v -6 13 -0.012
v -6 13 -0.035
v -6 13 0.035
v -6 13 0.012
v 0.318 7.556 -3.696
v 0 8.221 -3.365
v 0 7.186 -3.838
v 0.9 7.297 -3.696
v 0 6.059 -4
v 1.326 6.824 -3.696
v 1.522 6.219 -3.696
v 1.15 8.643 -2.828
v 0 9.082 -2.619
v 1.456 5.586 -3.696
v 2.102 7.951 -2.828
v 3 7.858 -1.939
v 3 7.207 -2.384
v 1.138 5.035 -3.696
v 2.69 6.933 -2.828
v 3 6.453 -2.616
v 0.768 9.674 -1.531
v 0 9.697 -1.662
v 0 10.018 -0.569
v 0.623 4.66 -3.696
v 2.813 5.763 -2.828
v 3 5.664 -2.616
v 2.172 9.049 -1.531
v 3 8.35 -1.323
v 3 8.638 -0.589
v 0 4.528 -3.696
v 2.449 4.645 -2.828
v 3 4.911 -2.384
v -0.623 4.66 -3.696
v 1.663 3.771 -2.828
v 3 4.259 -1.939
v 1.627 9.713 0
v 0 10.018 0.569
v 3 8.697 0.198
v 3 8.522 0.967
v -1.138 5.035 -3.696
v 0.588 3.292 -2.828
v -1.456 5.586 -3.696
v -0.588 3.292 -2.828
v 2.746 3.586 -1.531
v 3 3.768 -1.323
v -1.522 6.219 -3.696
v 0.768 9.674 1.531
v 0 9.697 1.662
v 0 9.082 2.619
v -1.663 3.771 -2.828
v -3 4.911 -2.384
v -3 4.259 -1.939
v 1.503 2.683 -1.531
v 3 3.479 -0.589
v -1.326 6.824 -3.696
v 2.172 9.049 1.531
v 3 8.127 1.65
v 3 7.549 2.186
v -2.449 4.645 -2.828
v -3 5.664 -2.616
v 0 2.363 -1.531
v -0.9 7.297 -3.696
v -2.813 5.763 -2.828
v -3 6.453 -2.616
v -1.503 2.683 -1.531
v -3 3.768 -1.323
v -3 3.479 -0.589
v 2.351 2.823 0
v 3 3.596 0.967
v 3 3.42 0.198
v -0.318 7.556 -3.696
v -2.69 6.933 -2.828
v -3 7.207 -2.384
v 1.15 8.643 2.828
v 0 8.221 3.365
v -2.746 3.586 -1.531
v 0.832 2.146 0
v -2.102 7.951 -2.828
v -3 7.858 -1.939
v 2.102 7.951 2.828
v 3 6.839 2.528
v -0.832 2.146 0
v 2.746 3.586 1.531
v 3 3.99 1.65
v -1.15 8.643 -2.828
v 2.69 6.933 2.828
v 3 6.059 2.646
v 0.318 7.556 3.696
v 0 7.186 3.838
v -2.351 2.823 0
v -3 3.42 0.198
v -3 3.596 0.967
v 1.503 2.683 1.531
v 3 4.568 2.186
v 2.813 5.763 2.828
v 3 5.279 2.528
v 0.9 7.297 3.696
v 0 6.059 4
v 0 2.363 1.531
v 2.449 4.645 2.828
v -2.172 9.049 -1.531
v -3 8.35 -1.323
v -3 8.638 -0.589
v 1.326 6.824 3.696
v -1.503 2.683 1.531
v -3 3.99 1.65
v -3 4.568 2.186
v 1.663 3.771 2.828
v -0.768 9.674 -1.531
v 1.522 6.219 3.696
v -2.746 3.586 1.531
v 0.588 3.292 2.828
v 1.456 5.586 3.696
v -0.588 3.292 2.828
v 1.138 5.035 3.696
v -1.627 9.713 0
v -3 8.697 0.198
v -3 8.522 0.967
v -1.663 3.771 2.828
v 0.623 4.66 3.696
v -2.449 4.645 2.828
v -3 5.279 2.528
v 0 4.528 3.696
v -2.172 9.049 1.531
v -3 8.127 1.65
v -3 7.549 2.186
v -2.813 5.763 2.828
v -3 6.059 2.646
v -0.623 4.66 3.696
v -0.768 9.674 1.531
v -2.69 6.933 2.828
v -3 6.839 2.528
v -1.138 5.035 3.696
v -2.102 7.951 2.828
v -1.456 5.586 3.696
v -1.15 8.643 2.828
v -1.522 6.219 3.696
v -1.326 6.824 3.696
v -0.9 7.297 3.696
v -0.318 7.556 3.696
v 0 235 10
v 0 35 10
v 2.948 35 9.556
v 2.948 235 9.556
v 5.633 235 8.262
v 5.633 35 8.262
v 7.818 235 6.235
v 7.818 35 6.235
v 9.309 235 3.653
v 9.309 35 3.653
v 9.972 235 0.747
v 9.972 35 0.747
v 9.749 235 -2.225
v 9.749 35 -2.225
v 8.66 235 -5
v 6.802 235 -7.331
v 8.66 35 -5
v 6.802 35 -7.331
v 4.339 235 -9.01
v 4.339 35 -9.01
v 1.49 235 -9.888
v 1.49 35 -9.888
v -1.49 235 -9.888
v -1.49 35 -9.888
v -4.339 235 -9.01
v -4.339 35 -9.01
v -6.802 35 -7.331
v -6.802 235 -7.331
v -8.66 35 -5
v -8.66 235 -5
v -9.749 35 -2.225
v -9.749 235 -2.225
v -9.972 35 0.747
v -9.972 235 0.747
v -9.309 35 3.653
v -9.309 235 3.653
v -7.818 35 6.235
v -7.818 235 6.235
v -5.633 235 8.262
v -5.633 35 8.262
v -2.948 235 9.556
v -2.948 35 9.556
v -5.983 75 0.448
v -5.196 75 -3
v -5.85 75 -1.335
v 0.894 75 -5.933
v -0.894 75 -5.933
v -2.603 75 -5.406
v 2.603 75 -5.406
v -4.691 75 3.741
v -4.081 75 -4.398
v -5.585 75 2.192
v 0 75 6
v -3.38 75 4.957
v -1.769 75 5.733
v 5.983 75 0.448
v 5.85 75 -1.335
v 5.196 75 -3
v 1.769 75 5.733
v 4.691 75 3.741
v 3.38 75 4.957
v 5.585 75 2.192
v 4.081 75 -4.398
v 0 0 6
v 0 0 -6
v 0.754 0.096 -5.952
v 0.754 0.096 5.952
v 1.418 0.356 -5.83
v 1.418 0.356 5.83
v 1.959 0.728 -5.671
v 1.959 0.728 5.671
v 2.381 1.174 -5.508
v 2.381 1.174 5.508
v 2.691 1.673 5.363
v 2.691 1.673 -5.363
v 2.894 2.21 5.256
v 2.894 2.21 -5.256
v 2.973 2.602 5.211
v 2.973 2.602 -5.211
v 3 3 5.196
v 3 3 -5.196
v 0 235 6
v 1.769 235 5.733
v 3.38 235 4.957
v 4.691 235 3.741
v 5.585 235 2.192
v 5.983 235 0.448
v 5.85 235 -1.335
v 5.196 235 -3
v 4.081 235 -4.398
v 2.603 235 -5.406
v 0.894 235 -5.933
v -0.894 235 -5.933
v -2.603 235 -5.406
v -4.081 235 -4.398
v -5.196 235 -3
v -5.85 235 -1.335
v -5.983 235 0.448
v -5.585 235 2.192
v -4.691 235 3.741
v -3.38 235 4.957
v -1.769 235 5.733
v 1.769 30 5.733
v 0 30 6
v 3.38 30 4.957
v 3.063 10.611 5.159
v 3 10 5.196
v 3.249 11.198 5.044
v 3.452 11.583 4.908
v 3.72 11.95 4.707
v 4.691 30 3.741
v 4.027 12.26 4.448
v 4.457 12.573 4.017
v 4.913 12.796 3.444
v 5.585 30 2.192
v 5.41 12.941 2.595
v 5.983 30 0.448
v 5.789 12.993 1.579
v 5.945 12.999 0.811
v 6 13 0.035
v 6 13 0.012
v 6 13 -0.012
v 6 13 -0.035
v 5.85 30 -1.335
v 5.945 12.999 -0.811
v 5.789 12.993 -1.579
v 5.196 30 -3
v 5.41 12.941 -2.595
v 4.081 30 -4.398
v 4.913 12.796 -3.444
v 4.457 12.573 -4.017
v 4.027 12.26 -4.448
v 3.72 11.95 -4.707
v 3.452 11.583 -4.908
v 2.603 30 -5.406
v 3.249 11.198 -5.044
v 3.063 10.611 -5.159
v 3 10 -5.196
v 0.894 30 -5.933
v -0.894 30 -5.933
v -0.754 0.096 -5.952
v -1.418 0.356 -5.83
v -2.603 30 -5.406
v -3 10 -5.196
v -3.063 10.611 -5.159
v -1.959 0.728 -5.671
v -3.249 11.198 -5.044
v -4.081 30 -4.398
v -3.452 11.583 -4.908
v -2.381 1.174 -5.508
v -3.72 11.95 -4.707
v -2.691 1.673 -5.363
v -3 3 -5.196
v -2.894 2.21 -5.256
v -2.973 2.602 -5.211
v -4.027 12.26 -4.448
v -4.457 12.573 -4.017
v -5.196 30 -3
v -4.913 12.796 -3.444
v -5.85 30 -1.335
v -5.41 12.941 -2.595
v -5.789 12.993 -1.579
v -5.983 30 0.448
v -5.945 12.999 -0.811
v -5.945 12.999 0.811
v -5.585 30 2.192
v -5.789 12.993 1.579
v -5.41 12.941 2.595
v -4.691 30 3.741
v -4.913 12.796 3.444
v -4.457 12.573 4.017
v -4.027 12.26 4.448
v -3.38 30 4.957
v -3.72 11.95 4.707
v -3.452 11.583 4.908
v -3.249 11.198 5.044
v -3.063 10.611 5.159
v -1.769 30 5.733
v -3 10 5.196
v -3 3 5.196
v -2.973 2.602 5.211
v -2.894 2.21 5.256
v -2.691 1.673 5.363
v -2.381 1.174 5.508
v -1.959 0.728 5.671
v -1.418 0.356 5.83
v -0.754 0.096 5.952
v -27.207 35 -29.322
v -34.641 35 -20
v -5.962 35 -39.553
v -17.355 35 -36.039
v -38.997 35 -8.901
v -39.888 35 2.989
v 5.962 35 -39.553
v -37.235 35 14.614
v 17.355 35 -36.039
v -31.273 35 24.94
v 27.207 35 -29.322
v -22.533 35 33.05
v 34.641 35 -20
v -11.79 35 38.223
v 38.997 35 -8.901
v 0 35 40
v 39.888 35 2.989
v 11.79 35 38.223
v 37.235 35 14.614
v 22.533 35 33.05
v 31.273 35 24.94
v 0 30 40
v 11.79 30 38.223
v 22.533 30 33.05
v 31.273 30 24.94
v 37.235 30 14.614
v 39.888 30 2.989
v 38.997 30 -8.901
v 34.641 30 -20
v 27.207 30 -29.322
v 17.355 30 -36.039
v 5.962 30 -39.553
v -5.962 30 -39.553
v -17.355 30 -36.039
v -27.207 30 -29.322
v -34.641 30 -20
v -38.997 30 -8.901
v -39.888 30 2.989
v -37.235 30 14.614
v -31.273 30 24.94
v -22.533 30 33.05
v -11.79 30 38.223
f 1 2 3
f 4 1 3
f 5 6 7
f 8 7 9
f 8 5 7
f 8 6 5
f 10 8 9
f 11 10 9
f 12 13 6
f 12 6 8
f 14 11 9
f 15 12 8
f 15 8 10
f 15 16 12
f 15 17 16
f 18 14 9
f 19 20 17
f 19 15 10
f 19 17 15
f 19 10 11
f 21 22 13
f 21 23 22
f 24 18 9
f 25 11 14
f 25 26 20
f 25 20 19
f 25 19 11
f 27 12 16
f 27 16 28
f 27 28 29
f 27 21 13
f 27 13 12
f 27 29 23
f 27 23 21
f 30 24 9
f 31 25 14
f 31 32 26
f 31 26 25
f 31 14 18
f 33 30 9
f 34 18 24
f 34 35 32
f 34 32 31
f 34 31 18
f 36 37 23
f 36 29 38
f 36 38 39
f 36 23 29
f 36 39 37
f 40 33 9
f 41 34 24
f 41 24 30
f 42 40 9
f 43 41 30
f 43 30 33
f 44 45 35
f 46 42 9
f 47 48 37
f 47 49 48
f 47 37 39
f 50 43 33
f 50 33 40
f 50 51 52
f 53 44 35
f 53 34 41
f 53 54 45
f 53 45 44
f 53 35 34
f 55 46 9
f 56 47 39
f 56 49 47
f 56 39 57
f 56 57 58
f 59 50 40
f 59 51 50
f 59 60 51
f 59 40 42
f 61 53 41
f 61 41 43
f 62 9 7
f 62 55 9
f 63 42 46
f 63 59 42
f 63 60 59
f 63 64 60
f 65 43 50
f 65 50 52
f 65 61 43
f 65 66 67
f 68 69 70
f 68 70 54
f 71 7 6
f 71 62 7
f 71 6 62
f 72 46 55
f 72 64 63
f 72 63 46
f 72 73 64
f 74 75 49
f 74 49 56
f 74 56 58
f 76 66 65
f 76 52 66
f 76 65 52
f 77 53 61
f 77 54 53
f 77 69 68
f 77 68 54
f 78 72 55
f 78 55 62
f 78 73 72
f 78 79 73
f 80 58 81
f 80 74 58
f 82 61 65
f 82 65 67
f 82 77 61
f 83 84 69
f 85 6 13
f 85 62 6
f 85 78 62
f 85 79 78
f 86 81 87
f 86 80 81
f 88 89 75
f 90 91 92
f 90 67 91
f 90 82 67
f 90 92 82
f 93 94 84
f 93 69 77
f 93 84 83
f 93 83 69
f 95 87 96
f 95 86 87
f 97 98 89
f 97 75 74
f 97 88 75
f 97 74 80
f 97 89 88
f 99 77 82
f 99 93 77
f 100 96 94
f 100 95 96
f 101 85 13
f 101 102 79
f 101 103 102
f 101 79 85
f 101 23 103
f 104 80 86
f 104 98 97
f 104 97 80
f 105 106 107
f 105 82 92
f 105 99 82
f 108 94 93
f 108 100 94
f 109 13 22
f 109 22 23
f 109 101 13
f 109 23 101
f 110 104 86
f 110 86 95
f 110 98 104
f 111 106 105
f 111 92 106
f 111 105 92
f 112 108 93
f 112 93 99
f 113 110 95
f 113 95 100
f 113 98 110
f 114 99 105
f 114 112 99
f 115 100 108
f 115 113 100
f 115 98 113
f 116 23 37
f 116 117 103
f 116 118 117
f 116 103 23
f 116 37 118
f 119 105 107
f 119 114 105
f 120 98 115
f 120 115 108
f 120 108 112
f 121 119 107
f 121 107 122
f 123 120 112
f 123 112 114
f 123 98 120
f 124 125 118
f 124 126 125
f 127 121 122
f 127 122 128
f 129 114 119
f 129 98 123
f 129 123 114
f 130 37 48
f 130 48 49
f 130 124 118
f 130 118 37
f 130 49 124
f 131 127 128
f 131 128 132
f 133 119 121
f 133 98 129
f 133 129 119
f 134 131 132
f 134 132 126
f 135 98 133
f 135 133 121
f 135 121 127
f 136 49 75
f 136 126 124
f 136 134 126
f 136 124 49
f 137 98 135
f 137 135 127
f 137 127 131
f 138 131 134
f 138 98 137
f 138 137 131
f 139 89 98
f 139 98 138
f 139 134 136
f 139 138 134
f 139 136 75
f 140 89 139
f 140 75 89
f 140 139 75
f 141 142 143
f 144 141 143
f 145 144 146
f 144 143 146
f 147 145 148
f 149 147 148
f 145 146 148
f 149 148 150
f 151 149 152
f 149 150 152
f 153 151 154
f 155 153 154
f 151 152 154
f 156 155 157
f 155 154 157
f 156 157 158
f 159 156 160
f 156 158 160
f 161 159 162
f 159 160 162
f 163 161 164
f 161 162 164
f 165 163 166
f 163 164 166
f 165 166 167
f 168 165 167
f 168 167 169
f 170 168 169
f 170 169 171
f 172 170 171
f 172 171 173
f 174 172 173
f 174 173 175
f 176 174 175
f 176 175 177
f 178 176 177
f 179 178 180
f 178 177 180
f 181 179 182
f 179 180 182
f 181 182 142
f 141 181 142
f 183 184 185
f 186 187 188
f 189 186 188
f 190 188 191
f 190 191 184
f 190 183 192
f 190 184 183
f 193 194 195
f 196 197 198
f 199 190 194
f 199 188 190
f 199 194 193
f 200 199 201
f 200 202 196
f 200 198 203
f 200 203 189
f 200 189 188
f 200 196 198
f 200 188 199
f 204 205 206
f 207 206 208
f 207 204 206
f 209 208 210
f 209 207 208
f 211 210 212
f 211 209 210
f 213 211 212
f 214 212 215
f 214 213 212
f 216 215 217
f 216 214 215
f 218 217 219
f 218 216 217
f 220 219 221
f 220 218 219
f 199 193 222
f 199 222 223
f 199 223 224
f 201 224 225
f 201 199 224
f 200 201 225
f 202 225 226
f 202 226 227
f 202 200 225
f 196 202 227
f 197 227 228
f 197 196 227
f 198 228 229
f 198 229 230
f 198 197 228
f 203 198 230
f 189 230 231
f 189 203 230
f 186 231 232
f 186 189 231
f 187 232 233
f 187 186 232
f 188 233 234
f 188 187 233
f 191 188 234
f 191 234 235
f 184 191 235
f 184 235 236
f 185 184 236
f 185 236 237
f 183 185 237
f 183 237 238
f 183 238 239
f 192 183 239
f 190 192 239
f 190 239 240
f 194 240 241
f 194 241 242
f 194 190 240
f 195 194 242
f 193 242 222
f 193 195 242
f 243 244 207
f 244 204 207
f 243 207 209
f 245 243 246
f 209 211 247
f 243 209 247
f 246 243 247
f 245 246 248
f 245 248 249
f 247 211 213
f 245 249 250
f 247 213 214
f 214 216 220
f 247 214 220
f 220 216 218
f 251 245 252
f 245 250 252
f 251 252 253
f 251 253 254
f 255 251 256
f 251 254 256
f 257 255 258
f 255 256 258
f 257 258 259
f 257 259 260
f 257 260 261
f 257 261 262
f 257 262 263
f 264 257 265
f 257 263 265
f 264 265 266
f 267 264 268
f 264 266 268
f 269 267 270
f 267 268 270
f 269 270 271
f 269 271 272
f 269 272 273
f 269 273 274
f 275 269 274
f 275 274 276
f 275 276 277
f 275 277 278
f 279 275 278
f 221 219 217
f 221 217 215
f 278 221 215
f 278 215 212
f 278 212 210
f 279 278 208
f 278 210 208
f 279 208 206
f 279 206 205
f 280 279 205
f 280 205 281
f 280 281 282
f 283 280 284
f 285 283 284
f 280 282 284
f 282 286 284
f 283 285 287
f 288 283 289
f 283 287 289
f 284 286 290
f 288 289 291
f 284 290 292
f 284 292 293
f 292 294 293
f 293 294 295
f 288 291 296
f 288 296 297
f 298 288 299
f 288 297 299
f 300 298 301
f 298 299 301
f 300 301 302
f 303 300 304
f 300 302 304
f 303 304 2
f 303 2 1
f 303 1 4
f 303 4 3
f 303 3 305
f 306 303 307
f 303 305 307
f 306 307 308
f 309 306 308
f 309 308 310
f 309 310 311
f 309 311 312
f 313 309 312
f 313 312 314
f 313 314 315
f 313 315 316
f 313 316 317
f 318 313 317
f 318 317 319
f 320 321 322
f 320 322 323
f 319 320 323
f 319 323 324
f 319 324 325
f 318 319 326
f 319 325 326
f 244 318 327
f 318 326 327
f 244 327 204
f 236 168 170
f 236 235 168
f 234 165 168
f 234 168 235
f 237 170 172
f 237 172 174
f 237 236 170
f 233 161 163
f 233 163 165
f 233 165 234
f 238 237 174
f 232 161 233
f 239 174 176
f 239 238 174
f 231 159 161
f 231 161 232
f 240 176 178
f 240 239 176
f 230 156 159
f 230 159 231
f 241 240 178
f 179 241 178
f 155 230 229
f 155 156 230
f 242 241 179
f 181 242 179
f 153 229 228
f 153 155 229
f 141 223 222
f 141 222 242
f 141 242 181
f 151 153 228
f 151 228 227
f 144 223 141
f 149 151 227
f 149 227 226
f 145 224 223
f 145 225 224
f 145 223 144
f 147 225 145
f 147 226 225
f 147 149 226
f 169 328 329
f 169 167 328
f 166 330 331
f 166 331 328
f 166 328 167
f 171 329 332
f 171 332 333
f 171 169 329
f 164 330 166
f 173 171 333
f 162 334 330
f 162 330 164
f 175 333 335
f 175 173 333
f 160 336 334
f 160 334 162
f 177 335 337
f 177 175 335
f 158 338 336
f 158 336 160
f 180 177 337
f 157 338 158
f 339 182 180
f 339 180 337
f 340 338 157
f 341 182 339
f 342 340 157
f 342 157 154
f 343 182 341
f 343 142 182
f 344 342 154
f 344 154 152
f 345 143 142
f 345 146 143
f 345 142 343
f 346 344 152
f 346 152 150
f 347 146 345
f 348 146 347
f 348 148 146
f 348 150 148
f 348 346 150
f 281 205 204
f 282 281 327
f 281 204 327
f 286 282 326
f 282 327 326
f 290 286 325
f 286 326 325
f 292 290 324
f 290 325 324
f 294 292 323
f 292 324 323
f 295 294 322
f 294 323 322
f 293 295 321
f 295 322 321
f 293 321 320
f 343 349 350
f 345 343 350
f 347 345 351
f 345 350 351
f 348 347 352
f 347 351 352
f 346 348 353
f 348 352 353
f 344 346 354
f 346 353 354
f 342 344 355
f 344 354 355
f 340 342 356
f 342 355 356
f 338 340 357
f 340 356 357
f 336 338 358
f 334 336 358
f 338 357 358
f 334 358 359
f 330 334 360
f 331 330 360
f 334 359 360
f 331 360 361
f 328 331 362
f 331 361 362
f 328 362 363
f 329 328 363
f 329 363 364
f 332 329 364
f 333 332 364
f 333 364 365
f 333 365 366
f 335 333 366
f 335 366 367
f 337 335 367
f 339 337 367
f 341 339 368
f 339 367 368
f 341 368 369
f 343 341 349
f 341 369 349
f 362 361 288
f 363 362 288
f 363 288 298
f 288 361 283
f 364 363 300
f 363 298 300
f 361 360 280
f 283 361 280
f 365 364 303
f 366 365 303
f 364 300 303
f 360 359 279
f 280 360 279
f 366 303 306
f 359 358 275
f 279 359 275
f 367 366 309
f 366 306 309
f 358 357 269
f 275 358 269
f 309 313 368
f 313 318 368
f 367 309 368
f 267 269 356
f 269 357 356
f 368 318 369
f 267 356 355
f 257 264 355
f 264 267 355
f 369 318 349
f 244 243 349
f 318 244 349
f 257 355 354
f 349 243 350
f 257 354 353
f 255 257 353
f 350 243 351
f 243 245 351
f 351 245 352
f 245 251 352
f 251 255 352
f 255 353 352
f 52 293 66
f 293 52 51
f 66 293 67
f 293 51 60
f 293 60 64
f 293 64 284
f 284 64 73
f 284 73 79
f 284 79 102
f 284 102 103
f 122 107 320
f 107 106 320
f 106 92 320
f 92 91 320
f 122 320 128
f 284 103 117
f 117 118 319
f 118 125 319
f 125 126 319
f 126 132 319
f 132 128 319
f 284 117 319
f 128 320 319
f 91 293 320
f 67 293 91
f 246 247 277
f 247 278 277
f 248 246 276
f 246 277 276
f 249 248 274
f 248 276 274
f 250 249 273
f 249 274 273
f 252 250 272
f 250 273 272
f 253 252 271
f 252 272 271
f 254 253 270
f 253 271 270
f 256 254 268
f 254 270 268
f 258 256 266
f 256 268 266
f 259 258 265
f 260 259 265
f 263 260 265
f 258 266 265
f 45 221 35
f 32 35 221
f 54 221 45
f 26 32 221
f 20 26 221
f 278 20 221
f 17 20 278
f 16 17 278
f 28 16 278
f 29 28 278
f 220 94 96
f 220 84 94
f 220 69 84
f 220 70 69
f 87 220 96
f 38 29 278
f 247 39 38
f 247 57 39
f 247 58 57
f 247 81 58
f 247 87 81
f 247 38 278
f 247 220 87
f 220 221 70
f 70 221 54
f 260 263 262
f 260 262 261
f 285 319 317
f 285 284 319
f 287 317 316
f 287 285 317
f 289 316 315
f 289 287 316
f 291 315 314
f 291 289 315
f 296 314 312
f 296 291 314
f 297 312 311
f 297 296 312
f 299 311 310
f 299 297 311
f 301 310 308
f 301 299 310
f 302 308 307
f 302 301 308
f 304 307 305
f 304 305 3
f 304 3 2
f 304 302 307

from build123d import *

# Parameters (mm, degrees)
SCHIZZO1_R                   = 6
ESTRUSIONE_ESTRUSIONE1_DEPTH = 30
SCHIZZO2_R                   = 40
ESTRUSIONE_ESTRUSIONE2_DEPTH = 5
SCHIZZO3_R                   = 10
ESTRUSIONE_ESTRUSIONE3_DEPTH = 200
TAGLIO_ESTRUSIONE1_START     = -160
SCHIZZO4_R                   = 6
TAGLIO_ESTRUSIONE1_DEPTH     = 160
SCHIZZO5_W                   = 3
SCHIZZO5_H                   = 13
TAGLIO_ESTRUSIONE2_DEPTH     = 242.712639305
RACCORDO1_R                  = 3


with BuildPart() as part:
    # Schizzo1 → Estrusione-Estrusione1 (new body)
    with BuildSketch(Plane(origin=(0, 0, 0), x_dir=(1, 0, 0), z_dir=(0, 1, 0))):
        with Locations(Location((0, 0, 0), (0, 0, 270))):
            Circle(SCHIZZO1_R)
    extrude(amount=ESTRUSIONE_ESTRUSIONE1_DEPTH)

    # Schizzo2 → Estrusione-Estrusione2 (add)
    with BuildSketch(Plane(origin=(0, 30, 0), x_dir=(1, 0, 0), z_dir=(0, 1, 0))):
        with Locations(Location((0, 0, 0), (0, 0, 270))):
            Circle(SCHIZZO2_R)
    extrude(amount=ESTRUSIONE_ESTRUSIONE2_DEPTH)

    # Schizzo3 → Estrusione-Estrusione3 (add)
    with BuildSketch(Plane(origin=(0, 35, 0), x_dir=(1, 0, 0), z_dir=(0, 1, 0))):
        with Locations(Location((0, 0, 0), (0, 0, 270))):
            Circle(SCHIZZO3_R)
    extrude(amount=ESTRUSIONE_ESTRUSIONE3_DEPTH)

    # Schizzo4 → Taglio-Estrusione1 (cut)
    with BuildSketch(Plane(origin=(0, 235, 0), x_dir=(1, 0, 0), z_dir=(0, 1, 0)).offset(TAGLIO_ESTRUSIONE1_START)):
        with Locations(Location((0, 0, 0), (0, 0, 270))):
            Circle(SCHIZZO4_R)
    extrude(amount=TAGLIO_ESTRUSIONE1_DEPTH, mode=Mode.SUBTRACT)

    # Schizzo5 → Taglio-Estrusione2 (cut, symmetric)
    with BuildSketch(Plane.XY):
        with Locations((4.5, 6.5)):
            Rectangle(SCHIZZO5_W, SCHIZZO5_H)
    taglio_estrusione2 = extrude(amount=TAGLIO_ESTRUSIONE2_DEPTH, both=True, mode=Mode.SUBTRACT)

    # Specchia1: Taglio-Estrusione2 across plane
    add(taglio_estrusione2.mirror(Plane(origin=(0, 0, 0), x_dir=(0, 0, 1), z_dir=(1, 0, 0))), mode=Mode.SUBTRACT)


with BuildPart() as body_2:
    # Schizzo6 → Rivoluzione1 (revolve)
    with BuildSketch(Plane(origin=(0, 0, 0), x_dir=(0, 0, -1), z_dir=(1, 0, 0))):
        with BuildLine():
            Line((-4, 6.058790505), (4, 6.058790505))
            ThreePointArc((4, 6.058790505), (0, 10.058790505), (-4, 6.058790505))
        make_face()
    revolve(axis=Axis((0, 6.058790505, 4), (0, 0, -1)))


with BuildPart() as part_1:
    add(part.part)

    # Abbina1: cut body 2
    add(body_2.part, mode=Mode.SUBTRACT)

    # Raccordo1
    raccordo1_edges = [part_1.edges().sort_by_distance(p)[0] for p in [
        (3, 0, 0),
        (-3, 0, 0),
        (-3, 13, 0),
        (3, 13, 0),
    ]]
    fillet(raccordo1_edges, radius=RACCORDO1_R - 0.0001)  # a hair under: the kernel refuses the full size


solid = part_1.part
